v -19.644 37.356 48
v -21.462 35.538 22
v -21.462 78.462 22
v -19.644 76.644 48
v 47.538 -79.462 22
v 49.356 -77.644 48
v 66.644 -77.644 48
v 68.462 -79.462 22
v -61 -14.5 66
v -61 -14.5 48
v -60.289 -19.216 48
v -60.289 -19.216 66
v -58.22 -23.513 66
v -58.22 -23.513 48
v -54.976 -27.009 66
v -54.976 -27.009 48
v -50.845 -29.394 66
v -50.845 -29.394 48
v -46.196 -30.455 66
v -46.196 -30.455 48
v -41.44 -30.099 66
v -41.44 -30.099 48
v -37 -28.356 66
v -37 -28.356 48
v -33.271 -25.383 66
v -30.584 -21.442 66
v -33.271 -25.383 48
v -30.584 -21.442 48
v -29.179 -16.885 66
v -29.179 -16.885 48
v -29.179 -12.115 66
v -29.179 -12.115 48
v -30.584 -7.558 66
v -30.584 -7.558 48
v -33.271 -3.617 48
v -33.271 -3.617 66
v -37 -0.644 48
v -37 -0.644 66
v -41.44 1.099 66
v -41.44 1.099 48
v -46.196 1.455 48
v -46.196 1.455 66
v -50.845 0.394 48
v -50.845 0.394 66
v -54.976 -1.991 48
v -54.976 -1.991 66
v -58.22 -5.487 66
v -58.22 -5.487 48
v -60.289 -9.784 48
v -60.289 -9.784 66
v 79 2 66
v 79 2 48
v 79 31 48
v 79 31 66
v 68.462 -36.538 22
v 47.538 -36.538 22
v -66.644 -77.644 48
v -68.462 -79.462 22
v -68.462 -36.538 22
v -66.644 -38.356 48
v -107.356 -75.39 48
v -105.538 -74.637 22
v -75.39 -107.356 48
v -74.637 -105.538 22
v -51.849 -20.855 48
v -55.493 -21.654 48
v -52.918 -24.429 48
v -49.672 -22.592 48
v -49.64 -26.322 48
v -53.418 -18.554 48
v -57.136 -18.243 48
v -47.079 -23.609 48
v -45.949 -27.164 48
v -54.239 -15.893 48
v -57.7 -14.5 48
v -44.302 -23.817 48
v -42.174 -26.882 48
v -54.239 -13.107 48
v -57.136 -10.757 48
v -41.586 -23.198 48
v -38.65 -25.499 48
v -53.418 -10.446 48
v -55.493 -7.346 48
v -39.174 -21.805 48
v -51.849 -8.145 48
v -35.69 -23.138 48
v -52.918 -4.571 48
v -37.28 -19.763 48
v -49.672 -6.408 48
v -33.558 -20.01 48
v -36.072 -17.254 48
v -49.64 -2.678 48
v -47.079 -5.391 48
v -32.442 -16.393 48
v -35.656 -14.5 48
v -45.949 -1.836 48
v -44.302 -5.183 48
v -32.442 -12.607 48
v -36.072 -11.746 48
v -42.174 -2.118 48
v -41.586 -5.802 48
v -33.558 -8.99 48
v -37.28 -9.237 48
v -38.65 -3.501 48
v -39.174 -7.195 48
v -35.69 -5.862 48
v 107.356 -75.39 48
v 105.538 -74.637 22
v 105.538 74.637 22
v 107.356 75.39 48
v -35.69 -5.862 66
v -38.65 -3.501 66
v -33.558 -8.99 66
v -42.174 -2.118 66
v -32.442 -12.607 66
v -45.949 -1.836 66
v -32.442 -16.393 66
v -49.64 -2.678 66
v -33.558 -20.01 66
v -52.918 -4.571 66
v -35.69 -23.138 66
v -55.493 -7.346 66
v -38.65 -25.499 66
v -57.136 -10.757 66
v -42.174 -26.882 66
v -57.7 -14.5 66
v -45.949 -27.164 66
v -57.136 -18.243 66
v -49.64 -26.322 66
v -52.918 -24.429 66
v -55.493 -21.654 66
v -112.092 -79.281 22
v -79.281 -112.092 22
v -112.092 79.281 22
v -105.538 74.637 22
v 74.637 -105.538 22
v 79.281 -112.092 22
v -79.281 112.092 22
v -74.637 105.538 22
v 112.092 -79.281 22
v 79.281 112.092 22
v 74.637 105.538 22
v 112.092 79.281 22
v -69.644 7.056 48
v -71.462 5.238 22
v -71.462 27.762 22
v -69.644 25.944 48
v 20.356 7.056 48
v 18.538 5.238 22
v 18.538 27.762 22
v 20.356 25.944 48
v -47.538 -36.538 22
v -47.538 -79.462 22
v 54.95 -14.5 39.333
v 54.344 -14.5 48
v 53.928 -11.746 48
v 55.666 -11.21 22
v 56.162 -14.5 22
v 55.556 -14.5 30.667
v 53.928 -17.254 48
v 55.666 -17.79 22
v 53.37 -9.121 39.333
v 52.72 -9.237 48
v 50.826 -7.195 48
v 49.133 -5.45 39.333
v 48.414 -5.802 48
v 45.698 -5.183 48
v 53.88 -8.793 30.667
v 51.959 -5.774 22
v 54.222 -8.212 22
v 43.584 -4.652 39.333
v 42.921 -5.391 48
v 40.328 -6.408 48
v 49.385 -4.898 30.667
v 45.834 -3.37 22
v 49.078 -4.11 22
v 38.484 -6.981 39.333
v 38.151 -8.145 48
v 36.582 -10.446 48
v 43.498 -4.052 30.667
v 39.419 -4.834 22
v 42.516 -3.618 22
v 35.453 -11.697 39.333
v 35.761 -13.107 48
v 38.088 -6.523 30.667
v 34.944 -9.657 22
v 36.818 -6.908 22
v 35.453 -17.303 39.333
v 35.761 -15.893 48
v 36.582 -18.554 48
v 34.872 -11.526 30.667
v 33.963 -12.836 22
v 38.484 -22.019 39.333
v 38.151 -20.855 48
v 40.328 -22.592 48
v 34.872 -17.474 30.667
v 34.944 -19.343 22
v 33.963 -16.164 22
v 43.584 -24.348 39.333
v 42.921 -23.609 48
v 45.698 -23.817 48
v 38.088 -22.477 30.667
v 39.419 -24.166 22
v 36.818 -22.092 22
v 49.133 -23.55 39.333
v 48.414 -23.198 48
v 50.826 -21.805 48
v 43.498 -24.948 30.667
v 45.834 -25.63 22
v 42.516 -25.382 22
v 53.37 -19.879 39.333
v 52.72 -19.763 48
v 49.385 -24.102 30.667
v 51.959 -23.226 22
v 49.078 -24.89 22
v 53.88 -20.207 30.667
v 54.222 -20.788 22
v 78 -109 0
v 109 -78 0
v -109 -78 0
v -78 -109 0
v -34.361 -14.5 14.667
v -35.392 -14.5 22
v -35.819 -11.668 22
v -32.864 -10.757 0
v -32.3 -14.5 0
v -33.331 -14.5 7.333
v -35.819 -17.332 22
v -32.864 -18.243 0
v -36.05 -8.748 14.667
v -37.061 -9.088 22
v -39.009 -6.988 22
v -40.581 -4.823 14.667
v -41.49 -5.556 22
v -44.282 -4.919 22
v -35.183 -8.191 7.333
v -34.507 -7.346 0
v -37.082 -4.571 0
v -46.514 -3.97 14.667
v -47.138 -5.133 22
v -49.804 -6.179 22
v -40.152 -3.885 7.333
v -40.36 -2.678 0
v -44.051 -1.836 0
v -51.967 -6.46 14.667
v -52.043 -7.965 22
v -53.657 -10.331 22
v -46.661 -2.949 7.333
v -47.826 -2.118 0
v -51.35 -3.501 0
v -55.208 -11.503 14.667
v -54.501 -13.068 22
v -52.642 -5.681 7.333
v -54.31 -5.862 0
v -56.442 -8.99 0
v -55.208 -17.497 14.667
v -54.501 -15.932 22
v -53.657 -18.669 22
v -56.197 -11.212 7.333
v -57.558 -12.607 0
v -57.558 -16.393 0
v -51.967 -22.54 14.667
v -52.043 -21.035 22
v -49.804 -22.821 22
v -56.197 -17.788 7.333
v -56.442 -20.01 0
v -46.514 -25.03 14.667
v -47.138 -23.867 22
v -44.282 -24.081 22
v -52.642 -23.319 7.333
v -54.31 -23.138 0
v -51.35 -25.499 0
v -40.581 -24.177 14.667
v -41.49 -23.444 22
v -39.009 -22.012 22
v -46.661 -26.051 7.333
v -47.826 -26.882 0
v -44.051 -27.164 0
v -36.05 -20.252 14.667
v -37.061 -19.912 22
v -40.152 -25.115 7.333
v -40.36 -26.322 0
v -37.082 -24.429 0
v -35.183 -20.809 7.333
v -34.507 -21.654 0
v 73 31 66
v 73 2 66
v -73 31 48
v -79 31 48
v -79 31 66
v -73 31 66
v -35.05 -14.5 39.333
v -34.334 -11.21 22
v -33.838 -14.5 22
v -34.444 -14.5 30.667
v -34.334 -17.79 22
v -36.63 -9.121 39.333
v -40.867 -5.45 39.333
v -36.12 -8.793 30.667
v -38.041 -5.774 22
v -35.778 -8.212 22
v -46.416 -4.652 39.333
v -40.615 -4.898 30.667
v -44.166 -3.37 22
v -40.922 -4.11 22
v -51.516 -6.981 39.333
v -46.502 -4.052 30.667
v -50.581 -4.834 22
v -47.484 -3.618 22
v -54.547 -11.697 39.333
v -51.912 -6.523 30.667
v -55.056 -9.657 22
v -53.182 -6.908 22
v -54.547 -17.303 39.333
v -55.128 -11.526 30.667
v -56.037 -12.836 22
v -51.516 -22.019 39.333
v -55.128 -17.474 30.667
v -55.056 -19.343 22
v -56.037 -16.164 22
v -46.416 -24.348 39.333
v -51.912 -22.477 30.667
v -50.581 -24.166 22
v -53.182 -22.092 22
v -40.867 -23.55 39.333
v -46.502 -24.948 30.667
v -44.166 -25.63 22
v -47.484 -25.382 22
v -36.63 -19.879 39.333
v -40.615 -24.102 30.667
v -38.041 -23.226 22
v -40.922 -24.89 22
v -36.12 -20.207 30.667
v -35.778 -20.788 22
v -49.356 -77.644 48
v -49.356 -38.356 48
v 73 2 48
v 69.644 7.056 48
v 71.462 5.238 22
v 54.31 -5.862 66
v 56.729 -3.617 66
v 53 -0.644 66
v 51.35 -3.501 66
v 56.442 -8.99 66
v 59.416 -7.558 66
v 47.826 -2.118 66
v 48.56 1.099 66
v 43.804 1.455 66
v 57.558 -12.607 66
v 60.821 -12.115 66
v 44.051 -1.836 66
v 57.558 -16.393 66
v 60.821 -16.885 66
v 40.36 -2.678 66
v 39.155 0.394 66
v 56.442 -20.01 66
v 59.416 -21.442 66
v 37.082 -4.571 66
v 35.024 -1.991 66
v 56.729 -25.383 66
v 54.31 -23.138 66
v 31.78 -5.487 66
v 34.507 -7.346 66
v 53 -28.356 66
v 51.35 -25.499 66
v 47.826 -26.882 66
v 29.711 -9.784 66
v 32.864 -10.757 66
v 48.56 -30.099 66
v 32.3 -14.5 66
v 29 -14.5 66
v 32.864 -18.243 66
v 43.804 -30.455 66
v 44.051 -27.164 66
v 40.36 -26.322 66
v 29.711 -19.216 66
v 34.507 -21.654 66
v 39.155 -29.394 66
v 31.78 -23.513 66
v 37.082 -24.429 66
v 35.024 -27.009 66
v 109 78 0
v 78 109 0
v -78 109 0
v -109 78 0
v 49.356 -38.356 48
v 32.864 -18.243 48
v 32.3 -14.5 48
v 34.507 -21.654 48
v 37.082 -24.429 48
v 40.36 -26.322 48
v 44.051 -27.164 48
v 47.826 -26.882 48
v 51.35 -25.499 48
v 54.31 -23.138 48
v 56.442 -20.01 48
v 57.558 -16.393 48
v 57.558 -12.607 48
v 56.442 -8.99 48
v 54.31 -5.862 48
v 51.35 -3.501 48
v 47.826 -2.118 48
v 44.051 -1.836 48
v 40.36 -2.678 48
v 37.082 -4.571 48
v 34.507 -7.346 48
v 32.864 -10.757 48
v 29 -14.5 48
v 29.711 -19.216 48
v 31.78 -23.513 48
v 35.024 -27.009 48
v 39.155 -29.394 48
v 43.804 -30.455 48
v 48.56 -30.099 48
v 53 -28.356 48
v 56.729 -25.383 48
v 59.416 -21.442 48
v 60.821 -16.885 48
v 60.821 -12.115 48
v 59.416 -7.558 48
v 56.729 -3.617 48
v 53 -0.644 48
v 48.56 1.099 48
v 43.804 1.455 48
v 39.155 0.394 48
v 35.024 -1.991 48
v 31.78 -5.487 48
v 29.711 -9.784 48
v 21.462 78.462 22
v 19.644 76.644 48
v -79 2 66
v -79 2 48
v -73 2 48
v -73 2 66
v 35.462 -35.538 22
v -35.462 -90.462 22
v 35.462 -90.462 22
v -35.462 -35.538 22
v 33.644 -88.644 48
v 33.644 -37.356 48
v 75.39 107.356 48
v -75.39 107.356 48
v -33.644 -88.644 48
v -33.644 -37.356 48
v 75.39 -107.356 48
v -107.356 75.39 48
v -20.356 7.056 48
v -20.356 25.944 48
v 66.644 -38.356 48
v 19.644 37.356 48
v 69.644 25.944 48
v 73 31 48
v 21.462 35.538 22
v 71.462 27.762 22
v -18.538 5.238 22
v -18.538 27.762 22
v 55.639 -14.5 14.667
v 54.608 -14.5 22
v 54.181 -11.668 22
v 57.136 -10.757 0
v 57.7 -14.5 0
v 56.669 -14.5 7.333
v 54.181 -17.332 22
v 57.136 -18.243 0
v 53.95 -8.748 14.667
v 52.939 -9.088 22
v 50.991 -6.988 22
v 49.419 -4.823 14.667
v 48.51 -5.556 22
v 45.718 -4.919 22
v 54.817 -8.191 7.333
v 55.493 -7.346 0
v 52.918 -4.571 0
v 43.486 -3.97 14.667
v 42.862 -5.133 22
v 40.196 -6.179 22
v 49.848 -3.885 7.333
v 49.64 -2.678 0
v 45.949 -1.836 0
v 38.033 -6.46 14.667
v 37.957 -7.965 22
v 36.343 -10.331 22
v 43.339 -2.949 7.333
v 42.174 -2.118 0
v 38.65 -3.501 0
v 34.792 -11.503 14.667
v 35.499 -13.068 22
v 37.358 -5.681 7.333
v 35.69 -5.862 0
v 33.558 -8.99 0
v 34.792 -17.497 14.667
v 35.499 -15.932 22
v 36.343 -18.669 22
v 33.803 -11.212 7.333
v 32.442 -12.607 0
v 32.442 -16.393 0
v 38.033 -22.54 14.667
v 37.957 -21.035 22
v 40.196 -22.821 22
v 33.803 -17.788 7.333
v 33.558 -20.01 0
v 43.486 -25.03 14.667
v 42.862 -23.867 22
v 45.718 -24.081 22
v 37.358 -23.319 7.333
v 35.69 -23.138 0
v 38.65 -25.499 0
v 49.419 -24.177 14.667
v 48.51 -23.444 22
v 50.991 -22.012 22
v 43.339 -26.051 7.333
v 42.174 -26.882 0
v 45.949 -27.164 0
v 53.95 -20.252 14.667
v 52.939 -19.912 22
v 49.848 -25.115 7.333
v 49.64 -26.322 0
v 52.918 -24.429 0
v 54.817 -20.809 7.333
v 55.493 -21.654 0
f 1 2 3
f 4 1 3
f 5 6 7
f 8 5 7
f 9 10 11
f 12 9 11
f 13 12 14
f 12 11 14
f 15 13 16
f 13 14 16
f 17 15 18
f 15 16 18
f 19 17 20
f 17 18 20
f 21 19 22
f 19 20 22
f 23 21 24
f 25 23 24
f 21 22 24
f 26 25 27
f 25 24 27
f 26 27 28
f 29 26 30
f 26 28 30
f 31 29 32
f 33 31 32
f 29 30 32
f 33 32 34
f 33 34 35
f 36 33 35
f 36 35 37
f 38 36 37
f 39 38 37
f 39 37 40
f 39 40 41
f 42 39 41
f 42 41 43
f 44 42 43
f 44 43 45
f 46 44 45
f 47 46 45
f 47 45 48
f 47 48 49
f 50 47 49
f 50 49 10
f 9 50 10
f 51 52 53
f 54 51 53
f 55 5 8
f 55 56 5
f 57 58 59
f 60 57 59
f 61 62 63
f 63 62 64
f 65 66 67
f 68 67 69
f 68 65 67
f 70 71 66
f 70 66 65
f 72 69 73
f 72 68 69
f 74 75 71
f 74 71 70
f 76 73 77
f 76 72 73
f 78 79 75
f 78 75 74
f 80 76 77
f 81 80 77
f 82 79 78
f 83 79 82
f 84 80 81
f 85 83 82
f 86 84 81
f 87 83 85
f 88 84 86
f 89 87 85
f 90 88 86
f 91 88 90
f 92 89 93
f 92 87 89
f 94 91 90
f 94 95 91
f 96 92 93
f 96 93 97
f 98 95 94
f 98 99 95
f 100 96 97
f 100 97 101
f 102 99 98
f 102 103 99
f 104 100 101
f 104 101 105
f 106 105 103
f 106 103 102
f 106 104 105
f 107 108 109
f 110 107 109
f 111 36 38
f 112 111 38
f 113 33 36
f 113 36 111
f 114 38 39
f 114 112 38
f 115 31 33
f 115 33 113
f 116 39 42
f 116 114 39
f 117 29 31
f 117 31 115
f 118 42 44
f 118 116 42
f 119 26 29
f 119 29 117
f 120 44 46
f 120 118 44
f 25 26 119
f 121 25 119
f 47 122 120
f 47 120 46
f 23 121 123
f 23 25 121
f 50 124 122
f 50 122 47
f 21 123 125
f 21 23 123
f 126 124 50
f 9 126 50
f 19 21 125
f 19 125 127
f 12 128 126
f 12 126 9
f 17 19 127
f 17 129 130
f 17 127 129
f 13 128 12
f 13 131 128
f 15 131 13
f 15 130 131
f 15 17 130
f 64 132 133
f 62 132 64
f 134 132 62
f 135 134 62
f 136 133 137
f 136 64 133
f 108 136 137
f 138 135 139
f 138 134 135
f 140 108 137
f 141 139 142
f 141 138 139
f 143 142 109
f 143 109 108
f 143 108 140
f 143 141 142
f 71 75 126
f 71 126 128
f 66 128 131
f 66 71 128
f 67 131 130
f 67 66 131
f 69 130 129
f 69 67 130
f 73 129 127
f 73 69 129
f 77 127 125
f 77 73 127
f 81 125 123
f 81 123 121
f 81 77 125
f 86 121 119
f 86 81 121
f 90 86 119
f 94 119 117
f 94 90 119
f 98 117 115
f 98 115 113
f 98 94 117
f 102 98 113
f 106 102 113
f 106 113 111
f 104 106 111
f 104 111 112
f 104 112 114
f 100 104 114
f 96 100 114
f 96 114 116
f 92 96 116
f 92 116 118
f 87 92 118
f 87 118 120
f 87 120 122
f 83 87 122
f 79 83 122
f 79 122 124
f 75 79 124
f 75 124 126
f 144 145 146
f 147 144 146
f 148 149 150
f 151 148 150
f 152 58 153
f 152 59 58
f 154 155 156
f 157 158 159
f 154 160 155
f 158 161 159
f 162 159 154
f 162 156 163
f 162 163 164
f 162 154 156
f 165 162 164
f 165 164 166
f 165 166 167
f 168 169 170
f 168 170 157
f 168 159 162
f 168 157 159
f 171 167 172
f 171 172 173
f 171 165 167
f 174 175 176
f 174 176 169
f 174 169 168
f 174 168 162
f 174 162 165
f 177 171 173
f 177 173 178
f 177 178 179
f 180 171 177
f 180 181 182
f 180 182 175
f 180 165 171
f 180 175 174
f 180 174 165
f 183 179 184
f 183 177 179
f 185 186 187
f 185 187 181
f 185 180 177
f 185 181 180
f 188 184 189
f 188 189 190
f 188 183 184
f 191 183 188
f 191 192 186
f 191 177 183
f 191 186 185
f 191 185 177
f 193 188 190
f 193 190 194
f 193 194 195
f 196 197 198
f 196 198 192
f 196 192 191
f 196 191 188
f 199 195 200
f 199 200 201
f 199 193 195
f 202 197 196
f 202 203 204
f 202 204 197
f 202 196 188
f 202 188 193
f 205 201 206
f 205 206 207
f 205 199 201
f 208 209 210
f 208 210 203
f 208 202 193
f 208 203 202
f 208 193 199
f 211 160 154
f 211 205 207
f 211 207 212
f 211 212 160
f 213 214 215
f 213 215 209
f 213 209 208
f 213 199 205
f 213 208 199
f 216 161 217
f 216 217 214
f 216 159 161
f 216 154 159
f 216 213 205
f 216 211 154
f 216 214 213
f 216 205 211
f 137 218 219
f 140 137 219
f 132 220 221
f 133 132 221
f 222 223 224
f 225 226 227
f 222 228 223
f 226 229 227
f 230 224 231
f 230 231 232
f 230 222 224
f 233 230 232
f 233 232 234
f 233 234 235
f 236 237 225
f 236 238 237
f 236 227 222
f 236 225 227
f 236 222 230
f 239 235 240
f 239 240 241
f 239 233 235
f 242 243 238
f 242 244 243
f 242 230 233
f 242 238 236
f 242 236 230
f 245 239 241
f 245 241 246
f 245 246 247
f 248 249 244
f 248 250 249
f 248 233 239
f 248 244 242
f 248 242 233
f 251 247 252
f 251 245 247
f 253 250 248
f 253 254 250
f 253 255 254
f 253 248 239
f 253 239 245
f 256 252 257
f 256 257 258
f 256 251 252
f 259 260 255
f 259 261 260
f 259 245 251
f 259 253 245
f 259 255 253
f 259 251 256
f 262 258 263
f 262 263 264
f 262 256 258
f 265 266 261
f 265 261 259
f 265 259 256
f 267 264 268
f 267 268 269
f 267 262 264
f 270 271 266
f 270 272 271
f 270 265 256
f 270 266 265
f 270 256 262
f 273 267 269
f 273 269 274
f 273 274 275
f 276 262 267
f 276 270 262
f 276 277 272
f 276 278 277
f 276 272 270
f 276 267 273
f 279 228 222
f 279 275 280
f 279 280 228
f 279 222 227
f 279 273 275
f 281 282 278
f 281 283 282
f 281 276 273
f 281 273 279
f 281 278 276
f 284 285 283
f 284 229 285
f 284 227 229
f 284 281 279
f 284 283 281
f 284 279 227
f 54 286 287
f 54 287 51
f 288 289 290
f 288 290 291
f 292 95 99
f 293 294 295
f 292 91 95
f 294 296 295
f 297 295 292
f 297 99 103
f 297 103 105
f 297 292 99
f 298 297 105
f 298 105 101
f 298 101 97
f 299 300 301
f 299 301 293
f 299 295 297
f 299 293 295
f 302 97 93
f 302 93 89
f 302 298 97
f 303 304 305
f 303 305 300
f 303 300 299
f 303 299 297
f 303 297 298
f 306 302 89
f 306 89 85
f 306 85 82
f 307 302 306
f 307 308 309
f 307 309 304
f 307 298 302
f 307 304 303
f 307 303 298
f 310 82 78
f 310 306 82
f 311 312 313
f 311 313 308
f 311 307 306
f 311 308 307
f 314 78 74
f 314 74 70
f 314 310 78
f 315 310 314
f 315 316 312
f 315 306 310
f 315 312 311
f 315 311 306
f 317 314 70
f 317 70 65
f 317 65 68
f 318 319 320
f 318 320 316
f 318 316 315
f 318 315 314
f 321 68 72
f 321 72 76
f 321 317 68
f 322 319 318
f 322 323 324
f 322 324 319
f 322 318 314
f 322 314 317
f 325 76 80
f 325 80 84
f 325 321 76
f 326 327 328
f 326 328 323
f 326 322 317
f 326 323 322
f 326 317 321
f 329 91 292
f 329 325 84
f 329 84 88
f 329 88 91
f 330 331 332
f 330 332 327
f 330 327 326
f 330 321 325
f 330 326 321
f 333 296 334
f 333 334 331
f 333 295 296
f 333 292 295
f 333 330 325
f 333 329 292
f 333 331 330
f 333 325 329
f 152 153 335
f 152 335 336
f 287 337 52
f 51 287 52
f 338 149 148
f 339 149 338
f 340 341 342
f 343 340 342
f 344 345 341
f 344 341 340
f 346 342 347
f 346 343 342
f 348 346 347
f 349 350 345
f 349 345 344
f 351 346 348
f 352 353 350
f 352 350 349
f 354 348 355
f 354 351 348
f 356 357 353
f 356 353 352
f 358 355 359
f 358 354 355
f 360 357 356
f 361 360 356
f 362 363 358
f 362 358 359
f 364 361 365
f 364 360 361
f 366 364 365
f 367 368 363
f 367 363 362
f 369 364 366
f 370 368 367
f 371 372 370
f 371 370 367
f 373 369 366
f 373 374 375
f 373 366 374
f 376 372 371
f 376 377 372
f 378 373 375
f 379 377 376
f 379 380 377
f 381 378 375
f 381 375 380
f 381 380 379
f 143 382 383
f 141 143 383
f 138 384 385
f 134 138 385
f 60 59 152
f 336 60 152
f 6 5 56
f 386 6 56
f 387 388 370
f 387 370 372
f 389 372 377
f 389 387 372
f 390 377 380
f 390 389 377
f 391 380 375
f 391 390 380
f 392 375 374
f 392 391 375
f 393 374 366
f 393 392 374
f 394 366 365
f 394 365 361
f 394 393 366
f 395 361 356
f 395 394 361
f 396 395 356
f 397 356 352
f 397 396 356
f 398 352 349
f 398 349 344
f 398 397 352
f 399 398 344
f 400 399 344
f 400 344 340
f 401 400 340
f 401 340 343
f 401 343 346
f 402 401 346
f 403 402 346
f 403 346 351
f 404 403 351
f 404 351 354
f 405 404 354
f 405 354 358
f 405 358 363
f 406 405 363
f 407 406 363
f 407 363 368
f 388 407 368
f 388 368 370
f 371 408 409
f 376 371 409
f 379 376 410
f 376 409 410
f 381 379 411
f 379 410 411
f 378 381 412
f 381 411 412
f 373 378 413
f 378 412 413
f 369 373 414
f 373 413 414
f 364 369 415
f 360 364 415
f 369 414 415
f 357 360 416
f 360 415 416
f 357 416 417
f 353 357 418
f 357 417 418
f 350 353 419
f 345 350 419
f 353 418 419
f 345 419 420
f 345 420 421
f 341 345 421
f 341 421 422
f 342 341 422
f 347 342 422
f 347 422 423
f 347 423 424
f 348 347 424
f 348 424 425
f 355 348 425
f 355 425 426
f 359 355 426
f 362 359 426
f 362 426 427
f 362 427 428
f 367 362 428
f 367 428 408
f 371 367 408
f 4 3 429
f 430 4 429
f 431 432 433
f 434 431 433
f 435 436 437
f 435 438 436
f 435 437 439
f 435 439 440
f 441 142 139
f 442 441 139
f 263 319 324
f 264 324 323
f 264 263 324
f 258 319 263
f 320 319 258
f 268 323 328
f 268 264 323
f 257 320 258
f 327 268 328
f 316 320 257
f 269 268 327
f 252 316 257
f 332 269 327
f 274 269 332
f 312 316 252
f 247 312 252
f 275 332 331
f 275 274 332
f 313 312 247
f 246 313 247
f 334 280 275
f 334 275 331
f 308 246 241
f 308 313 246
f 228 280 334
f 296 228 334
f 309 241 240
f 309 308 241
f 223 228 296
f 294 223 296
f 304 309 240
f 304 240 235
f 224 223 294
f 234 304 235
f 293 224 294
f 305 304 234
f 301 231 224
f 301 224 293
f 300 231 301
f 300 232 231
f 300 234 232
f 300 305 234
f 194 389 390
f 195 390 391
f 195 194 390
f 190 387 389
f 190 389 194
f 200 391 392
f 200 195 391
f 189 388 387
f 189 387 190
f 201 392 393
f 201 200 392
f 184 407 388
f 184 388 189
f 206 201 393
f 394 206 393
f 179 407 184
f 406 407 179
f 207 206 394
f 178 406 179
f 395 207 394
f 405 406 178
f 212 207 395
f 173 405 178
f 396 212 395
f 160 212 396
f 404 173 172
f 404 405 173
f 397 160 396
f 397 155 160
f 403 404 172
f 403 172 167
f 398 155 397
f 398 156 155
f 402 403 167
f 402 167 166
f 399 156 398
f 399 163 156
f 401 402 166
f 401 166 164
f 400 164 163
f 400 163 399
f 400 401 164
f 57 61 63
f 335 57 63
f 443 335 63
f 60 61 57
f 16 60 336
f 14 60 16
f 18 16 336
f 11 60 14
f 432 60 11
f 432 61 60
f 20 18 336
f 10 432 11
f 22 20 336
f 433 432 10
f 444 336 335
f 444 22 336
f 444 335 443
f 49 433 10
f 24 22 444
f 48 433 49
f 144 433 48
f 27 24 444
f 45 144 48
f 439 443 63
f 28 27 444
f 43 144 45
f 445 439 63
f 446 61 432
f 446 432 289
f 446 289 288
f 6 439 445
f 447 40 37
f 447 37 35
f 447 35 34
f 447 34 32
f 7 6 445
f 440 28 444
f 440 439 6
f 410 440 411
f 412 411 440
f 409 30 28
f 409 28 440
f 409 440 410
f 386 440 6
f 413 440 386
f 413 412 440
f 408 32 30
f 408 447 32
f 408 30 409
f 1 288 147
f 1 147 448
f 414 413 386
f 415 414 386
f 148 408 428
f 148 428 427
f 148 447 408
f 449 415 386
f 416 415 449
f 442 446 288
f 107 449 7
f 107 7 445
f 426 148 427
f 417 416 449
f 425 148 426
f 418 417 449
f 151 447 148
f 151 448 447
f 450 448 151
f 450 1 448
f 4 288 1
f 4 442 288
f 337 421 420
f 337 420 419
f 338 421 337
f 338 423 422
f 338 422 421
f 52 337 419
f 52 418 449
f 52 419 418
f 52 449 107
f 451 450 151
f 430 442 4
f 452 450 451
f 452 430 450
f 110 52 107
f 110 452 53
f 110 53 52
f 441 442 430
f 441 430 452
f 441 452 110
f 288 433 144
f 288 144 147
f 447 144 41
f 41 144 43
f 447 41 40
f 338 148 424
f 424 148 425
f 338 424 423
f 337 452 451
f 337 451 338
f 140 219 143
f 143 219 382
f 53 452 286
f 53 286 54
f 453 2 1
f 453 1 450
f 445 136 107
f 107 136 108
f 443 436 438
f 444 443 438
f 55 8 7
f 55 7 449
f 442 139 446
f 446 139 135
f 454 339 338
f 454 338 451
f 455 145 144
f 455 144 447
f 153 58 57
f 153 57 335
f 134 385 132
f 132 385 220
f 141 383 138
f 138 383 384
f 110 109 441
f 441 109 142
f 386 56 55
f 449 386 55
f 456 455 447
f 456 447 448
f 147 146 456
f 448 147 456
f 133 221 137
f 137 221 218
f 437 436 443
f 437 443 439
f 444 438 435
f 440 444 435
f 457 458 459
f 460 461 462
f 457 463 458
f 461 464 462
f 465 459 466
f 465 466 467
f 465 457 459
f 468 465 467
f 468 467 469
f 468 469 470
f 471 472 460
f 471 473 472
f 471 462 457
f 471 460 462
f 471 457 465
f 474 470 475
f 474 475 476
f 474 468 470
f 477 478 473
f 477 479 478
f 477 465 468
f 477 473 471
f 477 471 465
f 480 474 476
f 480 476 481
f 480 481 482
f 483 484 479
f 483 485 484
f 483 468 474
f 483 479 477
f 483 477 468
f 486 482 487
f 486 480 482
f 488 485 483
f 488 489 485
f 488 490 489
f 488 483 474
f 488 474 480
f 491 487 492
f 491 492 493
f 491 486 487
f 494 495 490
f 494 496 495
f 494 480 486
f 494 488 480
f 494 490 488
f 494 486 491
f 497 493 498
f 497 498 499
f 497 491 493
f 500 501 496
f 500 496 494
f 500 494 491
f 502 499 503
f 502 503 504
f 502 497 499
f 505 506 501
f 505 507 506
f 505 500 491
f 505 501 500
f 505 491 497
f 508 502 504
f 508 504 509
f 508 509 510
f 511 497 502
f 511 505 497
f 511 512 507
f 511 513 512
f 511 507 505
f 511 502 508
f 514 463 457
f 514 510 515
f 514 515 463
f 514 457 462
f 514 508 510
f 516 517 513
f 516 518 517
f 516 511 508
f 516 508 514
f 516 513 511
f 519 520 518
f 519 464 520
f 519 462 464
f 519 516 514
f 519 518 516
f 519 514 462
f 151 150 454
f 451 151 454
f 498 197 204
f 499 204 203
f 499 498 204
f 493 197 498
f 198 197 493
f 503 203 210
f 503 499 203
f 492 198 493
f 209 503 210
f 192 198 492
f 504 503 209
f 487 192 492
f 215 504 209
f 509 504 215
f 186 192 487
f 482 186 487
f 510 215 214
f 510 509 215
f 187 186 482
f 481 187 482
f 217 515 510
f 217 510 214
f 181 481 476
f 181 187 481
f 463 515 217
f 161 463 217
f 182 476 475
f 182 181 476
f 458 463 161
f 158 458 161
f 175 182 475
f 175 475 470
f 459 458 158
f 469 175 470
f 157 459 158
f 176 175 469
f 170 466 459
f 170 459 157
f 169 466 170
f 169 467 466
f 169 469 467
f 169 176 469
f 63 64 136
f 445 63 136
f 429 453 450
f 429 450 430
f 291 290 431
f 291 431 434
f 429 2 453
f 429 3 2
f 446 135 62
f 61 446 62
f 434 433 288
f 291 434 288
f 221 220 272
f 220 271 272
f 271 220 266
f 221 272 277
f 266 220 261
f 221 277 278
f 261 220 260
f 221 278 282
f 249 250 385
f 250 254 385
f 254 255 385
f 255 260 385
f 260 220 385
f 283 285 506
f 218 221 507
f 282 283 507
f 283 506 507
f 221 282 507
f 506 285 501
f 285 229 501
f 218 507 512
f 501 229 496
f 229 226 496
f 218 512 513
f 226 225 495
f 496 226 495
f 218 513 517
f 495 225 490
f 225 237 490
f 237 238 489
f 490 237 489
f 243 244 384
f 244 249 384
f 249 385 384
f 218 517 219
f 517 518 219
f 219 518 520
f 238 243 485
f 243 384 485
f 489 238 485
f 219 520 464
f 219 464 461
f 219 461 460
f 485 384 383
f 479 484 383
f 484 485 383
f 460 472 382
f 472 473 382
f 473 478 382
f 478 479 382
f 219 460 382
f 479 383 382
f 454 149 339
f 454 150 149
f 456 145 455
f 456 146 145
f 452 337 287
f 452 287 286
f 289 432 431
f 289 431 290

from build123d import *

# Parameters (mm, degrees)
SKETCH1_R           = 12.7
SKETCH1_W           = 98
SKETCH1_H           = 16
BOSS_EXTRUDE1_DEPTH = 22
BOSS_EXTRUDE1_DRAFT = -8
SKETCH2_R           = 12.7
SKETCH2_W           = 56
SKETCH2_H           = 25.6
SKETCH2_W_2         = 46
SKETCH2_H_2         = 46
SKETCH2_W_3         = 74
SKETCH2_H_3         = 58
SKETCH2_W_4         = 24
BOSS_EXTRUDE2_DEPTH = 48
BOSS_EXTRUDE2_DRAFT = -4
SKETCH3_R           = 16
SKETCH3_R_2         = 12.7
SKETCH3_W           = 6
SKETCH3_H           = 29
BOSS_EXTRUDE3_DEPTH = 66


with BuildPart() as part:
    # Sketch1 → Boss-Extrude1 (with draft: the straight prism first)
    with BuildSketch(Plane.XY):
        Polygon((-78, 109), (-109, 78), (-109, -78), (-78, -109), (78, -109), (109, -78), (109, 78), (78, 109), align=None)
        with Locations((-45, -14.5)):
            Circle(SKETCH1_R, mode=Mode.SUBTRACT)
        with Locations((45, -14.5)):
            Circle(SKETCH1_R, mode=Mode.SUBTRACT)
        with Locations((0, 94)):
            Rectangle(SKETCH1_W, SKETCH1_H, mode=Mode.SUBTRACT)
    extrude(amount=BOSS_EXTRUDE1_DEPTH)
    # Boss-Extrude1: the draft: its side faces are tilted about the plane it starts from
    boss_extrude1_sides = [part.faces().sort_by_distance(p)[0] for p in [
        (-93.5, 93.5, 11),
        (-109, 0, 11),
        (-93.5, -93.5, 11),
        (0, -109, 11),
        (93.5, -93.5, 11),
        (109, 0, 11),
        (93.5, 93.5, 11),
        (0, 109, 11),
        (-57.7, -14.5, 11),
        (32.3, -14.5, 11),
        (-49, 94, 11),
        (0, 102, 11),
        (49, 94, 11),
        (0, 86, 11),
    ]]
    draft(boss_extrude1_sides, Plane.XY, BOSS_EXTRUDE1_DRAFT)


with BuildPart() as boss_extrude2_tool:
    # Sketch2 → Boss-Extrude2 (with draft: the straight prism first)
    with BuildSketch(Plane.XY):
        Polygon((-74, 104), (-104, 74), (-104, -74), (-74, -104), (74, -104), (104, -74), (104, 74), (74, 104), align=None)
        with Locations((-45, -14.5)):
            Circle(SKETCH2_R, mode=Mode.SUBTRACT)
        with Locations((45, -14.5)):
            Circle(SKETCH2_R, mode=Mode.SUBTRACT)
        with Locations((-45, 16.5)):
            Rectangle(SKETCH2_W, SKETCH2_H, mode=Mode.SUBTRACT)
        with Locations((45, 16.5)):
            Rectangle(SKETCH2_W, SKETCH2_H, mode=Mode.SUBTRACT)
        with Locations((0, 57)):
            Rectangle(SKETCH2_W_2, SKETCH2_H_2, mode=Mode.SUBTRACT)
        with Locations((0, -63)):
            Rectangle(SKETCH2_W_3, SKETCH2_H_3, mode=Mode.SUBTRACT)
        with Locations((-58, -58)):
            Rectangle(SKETCH2_W_4, SKETCH2_H_2, mode=Mode.SUBTRACT)
        with Locations((58, -58)):
            Rectangle(SKETCH2_W_4, SKETCH2_H_2, mode=Mode.SUBTRACT)
    extrude(amount=BOSS_EXTRUDE2_DEPTH)
    # Boss-Extrude2: the draft: its side faces are tilted about the plane it starts from
    boss_extrude2_sides = [boss_extrude2_tool.faces().sort_by_distance(p)[0] for p in [
        (-89, 89, 24),
        (-104, 0, 24),
        (-89, -89, 24),
        (0, -104, 24),
        (89, -89, 24),
        (104, 0, 24),
        (89, 89, 24),
        (0, 104, 24),
        (-57.7, -14.5, 24),
        (32.3, -14.5, 24),
        (-73, 16.5, 24),
        (-45, 29.3, 24),
        (-17, 16.5, 24),
        (-45, 3.7, 24),
        (17, 16.5, 24),
        (45, 29.3, 24),
        (73, 16.5, 24),
        (45, 3.7, 24),
        (-23, 57, 24),
        (0, 80, 24),
        (23, 57, 24),
        (0, 34, 24),
        (-37, -63, 24),
        (0, -34, 24),
        (37, -63, 24),
        (0, -92, 24),
        (-70, -58, 24),
        (-58, -35, 24),
        (-46, -58, 24),
        (-58, -81, 24),
        (46, -58, 24),
        (58, -35, 24),
        (70, -58, 24),
        (58, -81, 24),
    ]]
    draft(boss_extrude2_sides, Plane.XY, BOSS_EXTRUDE2_DRAFT)


with BuildPart() as part_1:
    add(part.part)

    # Boss-Extrude2: add boss_extrude2_tool
    add(boss_extrude2_tool.part)

    # Sketch3 → Boss-Extrude3 (add)
    # profile 1 of 4: a face of its own
    with BuildSketch(Plane.XY):
        with Locations(Location((-45, -14.5, 0), (0, 0, 180))):
            Circle(SKETCH3_R)
        with Locations(Location((-45, -14.5, 0), (0, 0, 180))):
            Circle(SKETCH3_R_2, mode=Mode.SUBTRACT)
    # profile 2 of 4: a face of its own
    with BuildSketch(Plane.XY):
        with Locations(Location((45, -14.5, 0), (0, 0, 180))):
            Circle(SKETCH3_R)
        with Locations(Location((45, -14.5, 0), (0, 0, 180))):
            Circle(SKETCH3_R_2, mode=Mode.SUBTRACT)
    # profile 3 of 4: a face of its own
    with BuildSketch(Plane.XY):
        with Locations((-76, 16.5)):
            Rectangle(SKETCH3_W, SKETCH3_H)
    # profile 4 of 4: a face of its own
    with BuildSketch(Plane.XY):
        with Locations((76, 16.5)):
            Rectangle(SKETCH3_W, SKETCH3_H)
    extrude(amount=BOSS_EXTRUDE3_DEPTH)


solid = part_1.part
